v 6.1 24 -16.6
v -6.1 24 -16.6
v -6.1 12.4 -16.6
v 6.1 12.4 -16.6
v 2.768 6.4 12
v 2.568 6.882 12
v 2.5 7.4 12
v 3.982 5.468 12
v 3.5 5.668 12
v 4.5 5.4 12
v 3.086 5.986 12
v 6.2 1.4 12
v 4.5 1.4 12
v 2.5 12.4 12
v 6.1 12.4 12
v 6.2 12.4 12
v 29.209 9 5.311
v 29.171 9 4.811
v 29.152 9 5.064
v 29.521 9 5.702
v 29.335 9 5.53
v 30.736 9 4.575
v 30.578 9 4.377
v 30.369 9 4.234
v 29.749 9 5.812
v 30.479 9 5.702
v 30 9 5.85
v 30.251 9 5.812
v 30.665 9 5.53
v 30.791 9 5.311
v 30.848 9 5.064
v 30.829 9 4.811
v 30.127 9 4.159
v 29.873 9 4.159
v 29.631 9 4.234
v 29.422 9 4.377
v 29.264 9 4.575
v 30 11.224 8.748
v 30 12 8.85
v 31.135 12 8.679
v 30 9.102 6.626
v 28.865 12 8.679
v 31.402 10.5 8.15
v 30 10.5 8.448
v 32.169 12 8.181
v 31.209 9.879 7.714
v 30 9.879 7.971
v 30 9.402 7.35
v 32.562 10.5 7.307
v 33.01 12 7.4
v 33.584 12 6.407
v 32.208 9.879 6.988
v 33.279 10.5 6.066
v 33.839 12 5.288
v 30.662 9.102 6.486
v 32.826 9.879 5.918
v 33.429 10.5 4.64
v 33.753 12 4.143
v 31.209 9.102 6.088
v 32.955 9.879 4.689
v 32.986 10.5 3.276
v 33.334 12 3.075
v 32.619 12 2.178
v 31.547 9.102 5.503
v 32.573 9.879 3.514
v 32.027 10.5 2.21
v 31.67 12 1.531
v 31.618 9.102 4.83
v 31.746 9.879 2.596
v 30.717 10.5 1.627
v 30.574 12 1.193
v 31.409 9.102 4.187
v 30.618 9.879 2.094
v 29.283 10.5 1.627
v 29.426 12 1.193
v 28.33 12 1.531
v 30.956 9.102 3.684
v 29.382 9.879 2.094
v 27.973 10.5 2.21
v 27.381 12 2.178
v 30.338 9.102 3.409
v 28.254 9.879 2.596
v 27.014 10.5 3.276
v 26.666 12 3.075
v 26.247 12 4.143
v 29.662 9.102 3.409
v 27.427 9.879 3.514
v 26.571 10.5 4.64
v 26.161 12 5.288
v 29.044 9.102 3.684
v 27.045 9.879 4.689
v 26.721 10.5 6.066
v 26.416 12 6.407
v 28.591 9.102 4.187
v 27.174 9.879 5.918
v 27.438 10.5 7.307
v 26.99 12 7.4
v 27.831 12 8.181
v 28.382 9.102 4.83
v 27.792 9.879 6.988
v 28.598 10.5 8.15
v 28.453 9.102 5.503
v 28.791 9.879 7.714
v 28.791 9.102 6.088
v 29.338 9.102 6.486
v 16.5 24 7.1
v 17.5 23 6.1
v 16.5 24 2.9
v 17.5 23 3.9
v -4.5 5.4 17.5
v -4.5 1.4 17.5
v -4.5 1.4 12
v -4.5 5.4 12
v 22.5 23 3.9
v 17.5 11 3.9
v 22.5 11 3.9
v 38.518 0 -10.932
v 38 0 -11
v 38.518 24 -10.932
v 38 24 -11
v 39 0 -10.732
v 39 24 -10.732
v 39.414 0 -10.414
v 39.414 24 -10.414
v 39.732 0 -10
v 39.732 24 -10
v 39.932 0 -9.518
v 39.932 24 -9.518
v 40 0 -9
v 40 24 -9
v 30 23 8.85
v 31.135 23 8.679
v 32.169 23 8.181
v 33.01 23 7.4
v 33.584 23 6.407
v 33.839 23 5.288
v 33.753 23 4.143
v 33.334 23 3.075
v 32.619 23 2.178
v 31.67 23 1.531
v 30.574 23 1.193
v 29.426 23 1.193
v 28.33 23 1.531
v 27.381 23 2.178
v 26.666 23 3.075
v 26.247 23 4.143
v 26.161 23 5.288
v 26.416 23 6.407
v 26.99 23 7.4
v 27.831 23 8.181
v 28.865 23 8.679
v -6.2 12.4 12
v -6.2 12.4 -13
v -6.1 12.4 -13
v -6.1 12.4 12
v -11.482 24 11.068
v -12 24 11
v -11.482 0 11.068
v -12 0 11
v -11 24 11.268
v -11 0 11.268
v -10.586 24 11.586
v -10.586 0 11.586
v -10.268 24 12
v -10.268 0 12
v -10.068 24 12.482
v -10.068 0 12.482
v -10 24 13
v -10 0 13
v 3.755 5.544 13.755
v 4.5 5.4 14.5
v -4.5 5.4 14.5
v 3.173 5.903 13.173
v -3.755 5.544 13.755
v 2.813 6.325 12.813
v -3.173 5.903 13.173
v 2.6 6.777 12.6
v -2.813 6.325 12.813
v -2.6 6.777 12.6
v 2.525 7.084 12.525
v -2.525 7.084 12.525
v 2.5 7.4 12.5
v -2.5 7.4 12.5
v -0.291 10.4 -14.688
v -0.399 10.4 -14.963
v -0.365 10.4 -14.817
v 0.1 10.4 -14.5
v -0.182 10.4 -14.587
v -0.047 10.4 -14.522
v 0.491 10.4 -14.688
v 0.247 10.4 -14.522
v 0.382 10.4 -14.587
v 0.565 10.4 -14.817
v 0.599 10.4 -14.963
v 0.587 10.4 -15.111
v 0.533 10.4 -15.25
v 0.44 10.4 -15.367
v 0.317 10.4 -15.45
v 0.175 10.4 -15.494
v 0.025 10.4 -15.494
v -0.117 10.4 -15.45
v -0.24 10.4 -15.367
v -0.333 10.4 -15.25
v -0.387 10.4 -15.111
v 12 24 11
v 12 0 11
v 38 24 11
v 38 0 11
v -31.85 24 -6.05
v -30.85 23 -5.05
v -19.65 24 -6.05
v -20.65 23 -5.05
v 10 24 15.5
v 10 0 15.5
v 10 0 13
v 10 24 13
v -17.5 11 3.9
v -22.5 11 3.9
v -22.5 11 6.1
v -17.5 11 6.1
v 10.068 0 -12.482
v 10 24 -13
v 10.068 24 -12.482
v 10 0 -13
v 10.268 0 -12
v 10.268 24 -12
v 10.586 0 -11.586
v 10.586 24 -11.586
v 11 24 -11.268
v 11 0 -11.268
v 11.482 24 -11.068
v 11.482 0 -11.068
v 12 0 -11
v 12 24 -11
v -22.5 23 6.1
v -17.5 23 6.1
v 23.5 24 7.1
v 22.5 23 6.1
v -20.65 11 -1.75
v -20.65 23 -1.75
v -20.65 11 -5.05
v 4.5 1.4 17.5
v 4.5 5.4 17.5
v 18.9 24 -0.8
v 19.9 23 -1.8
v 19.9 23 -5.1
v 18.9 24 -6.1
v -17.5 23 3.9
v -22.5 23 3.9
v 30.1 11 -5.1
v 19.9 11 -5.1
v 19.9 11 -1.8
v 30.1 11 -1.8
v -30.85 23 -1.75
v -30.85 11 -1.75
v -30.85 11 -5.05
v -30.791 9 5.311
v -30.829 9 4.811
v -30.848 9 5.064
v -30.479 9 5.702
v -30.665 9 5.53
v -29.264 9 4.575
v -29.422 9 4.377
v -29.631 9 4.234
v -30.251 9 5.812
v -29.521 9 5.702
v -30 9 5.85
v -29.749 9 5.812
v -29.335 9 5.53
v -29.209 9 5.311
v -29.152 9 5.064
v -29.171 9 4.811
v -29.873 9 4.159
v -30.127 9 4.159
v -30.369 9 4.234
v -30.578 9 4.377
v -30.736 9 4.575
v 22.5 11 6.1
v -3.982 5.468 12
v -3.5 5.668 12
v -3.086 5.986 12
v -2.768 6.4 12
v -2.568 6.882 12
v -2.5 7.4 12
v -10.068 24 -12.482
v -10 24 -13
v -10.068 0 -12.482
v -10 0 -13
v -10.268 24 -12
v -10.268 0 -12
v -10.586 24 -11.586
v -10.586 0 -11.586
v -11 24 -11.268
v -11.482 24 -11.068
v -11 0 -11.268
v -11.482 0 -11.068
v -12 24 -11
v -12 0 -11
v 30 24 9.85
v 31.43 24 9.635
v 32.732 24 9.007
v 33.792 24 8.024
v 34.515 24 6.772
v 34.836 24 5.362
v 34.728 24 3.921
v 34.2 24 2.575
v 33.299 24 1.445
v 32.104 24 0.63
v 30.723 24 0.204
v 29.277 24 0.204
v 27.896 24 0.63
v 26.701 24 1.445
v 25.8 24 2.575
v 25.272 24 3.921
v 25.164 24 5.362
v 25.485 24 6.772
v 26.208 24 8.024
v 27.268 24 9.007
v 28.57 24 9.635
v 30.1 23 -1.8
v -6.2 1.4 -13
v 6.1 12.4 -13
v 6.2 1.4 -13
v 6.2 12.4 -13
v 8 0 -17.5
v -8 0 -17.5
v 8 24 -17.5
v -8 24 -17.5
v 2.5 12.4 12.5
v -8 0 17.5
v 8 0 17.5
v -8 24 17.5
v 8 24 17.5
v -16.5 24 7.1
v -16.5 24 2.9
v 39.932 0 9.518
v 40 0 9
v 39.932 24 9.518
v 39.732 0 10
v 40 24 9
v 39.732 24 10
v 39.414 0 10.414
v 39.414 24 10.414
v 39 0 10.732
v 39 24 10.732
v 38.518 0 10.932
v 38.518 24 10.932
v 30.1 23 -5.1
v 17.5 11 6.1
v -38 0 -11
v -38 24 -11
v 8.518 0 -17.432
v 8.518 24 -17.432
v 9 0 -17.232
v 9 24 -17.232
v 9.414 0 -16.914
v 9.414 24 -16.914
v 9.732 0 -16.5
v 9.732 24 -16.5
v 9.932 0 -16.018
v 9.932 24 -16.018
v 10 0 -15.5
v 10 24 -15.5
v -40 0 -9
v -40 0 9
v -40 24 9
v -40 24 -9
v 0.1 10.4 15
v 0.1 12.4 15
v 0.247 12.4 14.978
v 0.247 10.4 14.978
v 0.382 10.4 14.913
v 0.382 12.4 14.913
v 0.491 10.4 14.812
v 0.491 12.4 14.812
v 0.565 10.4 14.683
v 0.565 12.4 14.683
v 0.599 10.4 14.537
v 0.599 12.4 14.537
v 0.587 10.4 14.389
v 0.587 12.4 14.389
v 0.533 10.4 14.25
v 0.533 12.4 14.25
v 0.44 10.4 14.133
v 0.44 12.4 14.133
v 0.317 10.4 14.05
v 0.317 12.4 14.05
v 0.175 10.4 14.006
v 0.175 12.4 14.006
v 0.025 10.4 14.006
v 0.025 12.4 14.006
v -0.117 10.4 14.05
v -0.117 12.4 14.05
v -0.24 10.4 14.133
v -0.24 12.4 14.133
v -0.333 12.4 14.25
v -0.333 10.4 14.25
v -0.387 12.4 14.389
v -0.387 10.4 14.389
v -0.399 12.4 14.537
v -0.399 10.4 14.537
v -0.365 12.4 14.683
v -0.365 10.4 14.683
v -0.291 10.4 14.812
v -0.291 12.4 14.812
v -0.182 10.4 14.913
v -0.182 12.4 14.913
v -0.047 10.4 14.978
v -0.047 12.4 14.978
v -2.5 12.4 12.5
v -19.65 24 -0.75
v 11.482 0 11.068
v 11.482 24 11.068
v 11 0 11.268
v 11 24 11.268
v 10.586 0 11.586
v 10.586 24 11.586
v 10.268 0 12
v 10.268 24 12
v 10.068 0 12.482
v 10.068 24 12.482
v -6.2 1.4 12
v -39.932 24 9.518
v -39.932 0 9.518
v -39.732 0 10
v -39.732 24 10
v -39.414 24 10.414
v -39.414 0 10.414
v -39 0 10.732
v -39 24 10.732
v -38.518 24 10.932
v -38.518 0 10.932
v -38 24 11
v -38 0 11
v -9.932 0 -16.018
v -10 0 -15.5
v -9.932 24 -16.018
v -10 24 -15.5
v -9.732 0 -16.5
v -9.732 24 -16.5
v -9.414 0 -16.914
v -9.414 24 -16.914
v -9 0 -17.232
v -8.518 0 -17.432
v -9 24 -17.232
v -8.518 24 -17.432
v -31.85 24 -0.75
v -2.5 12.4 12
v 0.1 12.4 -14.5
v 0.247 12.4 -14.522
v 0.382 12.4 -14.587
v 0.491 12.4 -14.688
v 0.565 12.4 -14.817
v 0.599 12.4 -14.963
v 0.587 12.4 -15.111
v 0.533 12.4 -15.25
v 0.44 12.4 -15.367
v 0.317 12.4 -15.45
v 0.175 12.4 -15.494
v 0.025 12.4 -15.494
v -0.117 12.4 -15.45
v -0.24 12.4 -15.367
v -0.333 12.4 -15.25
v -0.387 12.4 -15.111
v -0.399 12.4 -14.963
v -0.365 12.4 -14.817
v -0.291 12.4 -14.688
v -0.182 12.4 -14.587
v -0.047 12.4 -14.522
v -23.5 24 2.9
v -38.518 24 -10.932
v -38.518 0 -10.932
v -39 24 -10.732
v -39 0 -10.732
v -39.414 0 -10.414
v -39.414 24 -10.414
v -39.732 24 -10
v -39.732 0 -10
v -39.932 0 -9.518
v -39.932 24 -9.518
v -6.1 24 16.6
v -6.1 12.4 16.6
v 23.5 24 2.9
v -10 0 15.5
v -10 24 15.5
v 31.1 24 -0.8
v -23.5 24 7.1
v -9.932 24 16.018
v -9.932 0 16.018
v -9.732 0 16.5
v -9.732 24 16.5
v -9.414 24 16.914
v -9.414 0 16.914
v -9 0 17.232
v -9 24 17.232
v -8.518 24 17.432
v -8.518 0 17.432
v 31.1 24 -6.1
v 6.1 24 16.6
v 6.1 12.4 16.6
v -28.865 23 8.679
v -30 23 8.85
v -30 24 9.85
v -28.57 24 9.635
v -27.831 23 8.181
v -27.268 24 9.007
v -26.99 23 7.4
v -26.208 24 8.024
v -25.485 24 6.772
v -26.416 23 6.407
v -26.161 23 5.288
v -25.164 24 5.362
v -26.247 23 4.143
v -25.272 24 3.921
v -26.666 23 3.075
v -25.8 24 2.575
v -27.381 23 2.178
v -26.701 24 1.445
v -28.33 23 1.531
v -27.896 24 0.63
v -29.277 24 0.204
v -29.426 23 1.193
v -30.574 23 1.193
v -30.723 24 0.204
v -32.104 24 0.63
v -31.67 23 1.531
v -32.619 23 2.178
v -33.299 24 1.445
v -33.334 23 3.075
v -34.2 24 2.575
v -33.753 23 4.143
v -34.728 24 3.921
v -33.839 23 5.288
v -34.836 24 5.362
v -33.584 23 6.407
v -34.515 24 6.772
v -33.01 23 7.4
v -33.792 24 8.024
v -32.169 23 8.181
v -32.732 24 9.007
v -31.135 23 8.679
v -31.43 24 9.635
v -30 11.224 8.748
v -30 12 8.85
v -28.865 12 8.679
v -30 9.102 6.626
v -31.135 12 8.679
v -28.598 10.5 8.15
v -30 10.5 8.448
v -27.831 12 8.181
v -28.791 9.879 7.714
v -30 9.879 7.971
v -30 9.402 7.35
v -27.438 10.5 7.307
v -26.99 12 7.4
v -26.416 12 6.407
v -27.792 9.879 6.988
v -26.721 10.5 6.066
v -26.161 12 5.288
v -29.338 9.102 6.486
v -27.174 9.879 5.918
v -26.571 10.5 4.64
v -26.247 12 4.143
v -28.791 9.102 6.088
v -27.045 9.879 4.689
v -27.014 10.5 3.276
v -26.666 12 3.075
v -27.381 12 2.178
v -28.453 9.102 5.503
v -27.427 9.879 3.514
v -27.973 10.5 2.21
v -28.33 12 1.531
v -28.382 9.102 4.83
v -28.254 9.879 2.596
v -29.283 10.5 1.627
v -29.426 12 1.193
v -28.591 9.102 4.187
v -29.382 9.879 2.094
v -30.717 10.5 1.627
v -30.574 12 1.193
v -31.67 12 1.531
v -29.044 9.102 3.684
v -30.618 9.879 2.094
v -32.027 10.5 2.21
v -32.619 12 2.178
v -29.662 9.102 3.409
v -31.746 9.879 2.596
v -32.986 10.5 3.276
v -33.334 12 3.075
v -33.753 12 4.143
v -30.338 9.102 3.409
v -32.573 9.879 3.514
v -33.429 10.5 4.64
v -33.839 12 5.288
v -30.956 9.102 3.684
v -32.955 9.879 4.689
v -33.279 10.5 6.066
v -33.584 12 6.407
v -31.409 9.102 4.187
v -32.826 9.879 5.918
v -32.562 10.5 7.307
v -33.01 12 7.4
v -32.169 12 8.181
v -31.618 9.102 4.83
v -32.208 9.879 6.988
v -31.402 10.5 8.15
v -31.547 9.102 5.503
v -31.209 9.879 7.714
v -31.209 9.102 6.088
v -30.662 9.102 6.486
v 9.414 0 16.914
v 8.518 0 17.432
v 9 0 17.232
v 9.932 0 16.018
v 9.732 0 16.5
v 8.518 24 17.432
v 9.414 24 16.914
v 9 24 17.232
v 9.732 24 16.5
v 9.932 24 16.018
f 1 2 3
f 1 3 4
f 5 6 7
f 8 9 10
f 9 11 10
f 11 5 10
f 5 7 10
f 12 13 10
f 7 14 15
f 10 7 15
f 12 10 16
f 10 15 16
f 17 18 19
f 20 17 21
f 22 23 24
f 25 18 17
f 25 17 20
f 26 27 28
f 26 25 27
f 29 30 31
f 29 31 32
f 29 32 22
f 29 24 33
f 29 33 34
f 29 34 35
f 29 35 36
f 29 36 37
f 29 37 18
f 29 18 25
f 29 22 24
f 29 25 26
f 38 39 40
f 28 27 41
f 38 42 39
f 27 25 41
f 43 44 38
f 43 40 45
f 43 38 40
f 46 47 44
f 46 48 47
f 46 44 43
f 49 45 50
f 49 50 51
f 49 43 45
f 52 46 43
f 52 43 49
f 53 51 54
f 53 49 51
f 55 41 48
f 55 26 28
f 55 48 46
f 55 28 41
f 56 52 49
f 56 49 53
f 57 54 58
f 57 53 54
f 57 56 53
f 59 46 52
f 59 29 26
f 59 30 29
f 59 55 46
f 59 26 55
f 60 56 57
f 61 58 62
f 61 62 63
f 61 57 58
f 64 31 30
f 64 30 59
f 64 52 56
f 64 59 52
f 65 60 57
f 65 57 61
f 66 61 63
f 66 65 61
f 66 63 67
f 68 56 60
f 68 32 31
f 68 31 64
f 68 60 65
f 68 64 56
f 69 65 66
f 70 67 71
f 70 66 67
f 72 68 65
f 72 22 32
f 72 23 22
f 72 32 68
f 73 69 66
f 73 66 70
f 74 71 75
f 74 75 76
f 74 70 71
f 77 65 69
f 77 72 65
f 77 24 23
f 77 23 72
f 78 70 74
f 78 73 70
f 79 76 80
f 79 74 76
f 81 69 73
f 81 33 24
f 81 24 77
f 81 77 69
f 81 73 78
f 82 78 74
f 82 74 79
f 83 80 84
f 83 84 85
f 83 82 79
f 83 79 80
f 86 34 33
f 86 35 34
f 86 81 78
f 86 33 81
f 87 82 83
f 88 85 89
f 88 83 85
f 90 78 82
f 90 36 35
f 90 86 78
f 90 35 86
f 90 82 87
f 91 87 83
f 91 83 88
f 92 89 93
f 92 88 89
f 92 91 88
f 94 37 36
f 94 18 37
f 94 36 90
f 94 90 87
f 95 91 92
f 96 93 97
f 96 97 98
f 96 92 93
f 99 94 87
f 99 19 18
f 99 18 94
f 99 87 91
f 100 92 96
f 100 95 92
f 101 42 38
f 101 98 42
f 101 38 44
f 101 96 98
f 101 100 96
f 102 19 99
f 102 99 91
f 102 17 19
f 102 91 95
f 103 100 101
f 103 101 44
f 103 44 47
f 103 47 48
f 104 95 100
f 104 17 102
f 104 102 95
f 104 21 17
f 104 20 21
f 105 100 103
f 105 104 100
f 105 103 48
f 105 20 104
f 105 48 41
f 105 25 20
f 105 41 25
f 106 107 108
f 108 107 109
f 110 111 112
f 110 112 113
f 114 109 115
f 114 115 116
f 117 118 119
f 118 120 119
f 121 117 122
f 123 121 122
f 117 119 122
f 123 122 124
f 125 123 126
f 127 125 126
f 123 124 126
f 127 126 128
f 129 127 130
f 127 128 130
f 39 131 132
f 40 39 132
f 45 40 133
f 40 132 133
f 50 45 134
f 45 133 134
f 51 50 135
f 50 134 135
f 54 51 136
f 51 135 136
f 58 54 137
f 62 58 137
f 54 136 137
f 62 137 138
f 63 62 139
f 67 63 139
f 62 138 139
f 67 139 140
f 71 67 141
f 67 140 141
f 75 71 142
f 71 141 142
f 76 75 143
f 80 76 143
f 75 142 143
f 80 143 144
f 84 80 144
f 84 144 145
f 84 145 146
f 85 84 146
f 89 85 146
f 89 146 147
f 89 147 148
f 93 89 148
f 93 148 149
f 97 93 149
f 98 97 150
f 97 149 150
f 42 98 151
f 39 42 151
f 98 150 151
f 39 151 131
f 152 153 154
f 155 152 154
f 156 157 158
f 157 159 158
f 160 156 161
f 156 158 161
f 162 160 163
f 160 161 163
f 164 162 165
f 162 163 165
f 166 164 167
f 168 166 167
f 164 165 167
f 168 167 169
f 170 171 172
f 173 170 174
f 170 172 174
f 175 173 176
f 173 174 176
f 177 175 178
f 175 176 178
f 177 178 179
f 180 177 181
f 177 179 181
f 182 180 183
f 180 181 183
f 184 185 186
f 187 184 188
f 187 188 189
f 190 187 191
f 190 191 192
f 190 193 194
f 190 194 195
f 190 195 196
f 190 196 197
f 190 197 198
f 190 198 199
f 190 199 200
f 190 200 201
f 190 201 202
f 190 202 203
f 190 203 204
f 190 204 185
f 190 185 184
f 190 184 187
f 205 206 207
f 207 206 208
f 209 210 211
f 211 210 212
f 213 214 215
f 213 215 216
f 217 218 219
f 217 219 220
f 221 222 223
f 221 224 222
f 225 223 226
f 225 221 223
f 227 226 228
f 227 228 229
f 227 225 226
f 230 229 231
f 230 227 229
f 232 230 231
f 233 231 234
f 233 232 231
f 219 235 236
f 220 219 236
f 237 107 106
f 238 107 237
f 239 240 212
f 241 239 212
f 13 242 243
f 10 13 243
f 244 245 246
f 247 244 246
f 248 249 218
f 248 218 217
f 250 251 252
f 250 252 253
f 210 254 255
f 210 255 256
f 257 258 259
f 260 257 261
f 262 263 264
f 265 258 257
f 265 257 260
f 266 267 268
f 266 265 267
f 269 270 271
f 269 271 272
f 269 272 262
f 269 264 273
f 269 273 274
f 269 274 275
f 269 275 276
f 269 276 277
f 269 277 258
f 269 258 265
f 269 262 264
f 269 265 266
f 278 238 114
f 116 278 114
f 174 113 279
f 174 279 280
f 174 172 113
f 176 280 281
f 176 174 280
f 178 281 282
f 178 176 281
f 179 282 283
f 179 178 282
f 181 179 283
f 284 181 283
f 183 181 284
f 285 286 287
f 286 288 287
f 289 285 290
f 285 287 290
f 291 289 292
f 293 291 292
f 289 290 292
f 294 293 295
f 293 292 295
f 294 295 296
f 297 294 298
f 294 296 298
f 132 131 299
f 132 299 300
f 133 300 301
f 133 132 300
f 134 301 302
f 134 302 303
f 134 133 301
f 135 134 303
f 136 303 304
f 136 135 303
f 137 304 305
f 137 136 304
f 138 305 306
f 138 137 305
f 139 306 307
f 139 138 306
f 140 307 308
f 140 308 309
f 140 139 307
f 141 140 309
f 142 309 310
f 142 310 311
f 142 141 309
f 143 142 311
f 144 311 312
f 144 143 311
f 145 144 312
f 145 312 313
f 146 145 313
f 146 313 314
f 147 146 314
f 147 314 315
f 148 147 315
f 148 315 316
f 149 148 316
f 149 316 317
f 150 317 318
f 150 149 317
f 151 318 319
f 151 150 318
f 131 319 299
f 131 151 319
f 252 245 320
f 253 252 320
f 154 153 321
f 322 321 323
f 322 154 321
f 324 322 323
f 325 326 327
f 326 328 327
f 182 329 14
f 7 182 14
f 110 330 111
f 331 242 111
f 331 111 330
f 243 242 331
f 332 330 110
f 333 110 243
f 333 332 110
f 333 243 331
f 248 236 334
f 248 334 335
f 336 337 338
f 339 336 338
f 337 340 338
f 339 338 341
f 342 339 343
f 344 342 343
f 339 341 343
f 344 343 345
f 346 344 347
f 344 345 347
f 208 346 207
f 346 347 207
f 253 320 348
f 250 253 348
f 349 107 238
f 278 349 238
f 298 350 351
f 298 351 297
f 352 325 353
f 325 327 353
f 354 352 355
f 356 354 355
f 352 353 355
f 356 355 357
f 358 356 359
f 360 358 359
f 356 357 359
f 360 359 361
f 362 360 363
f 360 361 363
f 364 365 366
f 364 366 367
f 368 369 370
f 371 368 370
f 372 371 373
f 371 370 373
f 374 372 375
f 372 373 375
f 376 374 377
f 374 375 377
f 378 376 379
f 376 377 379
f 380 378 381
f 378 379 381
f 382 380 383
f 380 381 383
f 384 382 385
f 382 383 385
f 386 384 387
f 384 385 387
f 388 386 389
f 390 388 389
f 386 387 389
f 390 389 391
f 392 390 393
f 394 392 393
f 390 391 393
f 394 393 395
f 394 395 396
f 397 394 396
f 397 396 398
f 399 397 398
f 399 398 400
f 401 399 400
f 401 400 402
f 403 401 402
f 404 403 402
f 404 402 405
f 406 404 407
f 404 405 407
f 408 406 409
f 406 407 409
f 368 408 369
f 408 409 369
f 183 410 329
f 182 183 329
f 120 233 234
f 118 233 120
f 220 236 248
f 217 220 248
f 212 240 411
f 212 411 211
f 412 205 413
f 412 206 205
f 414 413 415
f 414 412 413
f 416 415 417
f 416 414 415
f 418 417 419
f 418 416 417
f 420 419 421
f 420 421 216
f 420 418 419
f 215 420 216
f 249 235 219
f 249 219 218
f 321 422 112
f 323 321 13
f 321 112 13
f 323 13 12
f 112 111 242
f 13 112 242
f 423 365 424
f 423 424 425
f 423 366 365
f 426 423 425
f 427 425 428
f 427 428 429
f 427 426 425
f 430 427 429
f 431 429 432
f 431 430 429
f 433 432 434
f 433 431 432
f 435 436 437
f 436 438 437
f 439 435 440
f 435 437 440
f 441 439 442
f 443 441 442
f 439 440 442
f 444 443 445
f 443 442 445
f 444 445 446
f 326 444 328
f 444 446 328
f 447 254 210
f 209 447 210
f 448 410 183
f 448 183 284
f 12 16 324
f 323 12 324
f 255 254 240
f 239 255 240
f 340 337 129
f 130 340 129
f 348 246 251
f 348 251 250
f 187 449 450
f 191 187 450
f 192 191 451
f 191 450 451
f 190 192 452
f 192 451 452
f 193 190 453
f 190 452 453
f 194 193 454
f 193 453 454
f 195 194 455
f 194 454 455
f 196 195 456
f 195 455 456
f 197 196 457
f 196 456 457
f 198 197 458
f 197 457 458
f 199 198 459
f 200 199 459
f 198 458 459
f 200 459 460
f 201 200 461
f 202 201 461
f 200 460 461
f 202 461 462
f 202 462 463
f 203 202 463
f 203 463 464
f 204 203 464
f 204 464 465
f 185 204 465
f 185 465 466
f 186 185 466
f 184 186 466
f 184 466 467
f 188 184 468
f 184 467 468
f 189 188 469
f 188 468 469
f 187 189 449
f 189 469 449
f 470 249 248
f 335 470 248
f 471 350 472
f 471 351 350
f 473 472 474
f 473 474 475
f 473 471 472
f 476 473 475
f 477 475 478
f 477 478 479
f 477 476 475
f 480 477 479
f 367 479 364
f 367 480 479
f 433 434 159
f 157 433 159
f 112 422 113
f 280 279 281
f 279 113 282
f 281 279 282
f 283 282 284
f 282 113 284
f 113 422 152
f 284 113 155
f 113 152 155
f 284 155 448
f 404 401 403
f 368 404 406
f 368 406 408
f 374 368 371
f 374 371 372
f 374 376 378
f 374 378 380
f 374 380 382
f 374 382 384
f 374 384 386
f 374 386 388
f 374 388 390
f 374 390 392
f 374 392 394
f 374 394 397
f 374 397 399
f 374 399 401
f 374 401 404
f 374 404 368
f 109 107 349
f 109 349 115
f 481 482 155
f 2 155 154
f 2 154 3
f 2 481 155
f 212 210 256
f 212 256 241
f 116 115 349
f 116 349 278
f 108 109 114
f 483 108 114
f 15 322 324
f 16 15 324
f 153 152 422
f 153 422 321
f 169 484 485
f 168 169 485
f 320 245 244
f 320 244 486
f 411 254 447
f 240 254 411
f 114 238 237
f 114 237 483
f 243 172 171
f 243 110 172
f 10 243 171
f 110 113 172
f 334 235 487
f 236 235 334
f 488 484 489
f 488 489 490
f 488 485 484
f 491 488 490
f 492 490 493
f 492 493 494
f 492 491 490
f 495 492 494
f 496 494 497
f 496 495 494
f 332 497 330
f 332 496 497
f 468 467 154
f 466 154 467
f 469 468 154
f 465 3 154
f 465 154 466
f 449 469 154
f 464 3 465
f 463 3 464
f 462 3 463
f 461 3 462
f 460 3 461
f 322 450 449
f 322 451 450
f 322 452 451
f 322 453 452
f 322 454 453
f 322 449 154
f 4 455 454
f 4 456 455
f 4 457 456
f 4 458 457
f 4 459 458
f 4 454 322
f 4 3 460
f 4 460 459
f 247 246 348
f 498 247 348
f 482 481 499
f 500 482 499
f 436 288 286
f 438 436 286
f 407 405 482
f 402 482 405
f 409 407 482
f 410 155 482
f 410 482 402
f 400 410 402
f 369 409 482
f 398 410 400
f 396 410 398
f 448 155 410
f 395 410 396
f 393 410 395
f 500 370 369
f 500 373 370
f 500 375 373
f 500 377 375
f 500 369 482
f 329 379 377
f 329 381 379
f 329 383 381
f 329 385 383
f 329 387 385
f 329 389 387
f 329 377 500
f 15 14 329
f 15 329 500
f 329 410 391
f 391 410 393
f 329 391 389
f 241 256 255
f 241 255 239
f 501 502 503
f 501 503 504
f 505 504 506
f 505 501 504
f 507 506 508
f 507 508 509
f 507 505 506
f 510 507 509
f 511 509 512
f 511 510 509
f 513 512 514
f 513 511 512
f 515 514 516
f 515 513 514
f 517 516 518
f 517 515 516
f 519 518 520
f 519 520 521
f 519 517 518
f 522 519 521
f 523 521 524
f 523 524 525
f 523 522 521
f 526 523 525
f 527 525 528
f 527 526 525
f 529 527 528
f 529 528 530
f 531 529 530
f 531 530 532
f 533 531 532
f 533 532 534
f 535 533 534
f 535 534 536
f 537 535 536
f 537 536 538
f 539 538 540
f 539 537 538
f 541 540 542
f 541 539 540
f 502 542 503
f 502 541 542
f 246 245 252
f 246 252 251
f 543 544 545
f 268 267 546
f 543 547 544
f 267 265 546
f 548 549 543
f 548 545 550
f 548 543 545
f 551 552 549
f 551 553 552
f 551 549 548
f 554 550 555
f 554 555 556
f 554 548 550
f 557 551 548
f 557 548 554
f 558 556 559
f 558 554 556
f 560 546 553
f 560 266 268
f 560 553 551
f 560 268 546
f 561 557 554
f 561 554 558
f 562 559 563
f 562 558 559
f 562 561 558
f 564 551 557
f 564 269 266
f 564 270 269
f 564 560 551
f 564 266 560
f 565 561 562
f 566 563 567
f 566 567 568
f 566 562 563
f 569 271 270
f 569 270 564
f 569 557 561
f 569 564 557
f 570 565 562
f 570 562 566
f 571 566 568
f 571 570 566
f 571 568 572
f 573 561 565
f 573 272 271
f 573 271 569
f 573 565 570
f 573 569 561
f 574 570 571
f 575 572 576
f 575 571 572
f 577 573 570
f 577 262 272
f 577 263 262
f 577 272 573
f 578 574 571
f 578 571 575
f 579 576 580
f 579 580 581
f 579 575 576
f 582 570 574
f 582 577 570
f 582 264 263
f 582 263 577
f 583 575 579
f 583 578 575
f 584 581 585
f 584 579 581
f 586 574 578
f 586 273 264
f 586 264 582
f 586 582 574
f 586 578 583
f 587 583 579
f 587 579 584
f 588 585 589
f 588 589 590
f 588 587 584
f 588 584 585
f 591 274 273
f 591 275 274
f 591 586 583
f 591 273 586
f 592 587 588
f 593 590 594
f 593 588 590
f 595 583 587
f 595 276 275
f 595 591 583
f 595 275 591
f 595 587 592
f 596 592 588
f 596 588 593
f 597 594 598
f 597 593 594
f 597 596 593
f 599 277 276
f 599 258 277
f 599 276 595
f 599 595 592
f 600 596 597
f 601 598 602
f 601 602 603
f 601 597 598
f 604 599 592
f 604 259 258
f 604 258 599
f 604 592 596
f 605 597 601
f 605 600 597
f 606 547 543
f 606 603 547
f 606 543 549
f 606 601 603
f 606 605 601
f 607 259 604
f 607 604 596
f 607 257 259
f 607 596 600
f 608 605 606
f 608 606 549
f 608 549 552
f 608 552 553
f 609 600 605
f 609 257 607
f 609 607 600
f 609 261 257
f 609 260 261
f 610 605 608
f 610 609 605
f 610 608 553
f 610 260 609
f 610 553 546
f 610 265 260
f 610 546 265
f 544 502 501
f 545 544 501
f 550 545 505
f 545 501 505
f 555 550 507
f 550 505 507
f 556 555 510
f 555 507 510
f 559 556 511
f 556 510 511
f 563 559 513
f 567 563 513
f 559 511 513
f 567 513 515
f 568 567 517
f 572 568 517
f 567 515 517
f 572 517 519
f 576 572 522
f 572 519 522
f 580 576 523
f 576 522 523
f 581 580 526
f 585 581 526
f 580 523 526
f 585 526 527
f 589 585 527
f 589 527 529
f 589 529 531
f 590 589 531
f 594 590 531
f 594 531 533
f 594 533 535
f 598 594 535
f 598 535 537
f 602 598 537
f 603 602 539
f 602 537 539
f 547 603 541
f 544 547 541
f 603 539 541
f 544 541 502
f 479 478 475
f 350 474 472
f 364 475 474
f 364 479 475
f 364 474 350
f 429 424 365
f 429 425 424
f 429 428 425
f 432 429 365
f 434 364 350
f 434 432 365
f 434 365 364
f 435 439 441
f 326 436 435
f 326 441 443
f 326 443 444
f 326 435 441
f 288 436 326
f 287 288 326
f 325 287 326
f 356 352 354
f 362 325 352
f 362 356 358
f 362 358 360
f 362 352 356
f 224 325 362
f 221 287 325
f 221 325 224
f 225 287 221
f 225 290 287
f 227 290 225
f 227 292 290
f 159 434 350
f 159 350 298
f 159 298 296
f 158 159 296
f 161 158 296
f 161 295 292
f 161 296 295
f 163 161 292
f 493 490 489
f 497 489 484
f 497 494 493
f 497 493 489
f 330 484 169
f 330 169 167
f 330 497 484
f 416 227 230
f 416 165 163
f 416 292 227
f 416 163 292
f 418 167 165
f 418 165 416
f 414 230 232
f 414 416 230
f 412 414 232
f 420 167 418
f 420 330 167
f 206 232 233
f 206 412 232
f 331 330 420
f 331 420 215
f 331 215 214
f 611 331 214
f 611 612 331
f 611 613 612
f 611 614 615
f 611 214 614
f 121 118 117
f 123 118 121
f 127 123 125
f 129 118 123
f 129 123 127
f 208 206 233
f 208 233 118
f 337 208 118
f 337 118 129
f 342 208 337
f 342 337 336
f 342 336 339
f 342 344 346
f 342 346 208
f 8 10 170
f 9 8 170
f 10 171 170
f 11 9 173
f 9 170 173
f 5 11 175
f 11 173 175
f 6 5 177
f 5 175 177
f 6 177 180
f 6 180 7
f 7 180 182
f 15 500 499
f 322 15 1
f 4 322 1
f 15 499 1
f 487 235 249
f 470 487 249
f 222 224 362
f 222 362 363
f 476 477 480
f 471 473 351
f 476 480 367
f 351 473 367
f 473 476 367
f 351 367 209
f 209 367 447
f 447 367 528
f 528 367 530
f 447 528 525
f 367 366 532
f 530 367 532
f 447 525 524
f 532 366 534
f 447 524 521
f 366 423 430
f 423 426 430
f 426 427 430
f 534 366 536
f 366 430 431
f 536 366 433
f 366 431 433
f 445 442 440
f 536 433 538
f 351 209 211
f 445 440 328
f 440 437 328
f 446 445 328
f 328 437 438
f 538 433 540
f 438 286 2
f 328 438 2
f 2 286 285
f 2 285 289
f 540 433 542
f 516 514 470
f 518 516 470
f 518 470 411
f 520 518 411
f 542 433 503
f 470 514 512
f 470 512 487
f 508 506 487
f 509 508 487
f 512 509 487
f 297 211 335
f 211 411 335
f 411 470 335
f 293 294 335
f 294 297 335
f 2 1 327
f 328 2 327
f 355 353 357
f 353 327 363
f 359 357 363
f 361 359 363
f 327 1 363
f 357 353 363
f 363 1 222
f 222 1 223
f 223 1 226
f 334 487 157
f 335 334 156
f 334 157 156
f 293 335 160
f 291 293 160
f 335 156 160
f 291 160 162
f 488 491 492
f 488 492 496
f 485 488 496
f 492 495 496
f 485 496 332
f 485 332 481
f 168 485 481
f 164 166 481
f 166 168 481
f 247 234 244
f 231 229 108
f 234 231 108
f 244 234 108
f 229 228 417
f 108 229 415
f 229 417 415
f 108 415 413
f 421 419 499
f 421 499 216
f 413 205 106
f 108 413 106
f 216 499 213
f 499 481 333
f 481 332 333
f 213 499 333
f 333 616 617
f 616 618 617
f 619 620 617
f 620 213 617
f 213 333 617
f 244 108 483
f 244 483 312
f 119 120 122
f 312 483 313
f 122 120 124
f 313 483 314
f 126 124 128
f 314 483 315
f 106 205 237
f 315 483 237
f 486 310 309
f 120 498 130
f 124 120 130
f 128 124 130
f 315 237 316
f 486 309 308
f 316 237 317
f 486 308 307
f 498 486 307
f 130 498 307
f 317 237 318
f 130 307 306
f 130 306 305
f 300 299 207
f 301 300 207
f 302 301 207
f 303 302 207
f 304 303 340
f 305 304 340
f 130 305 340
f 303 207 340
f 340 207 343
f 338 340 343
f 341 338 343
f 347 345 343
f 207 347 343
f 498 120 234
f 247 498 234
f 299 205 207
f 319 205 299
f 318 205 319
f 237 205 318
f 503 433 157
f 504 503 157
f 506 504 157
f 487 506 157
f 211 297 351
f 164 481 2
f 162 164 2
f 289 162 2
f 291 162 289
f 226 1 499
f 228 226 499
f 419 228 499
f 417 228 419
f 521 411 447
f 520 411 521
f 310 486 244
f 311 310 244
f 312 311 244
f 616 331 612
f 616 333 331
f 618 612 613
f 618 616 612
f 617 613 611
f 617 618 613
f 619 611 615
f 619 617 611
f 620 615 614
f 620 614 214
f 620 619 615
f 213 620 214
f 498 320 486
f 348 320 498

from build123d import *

# Parameters (mm, degrees)
SKETCH1_W               = 80
SKETCH1_H               = 22
BOSS_EXTRUDE1_DEPTH     = 24
SKETCH2_R               = 3.85
EYESHAFT_HOLES_DEPTH    = 15
SKETCH5_W               = 5
SKETCH5_H               = 2.2
FRONT_LEG_HOLES_DEPTH   = 13
SKETCH6_W               = 20
SKETCH6_H               = 24
SERVO_BLOCK_DEPTH       = 17.5
SKETCH7_W               = 10.2
SKETCH7_H               = 3.3
BACK_LEGS_DEPTH         = 13
FILLET1_R               = 3
SKETCH8_R               = 2.714277304
CUT_EXTRUDE4_DEPTH      = 14
SKETCH9_W               = 12.2
SKETCH9_H               = 33.2
SERVO_ARMS1_DEPTH       = 11.6
FILLET2_R               = 2
CHAMFER1_SIZE           = 1
SKETCH14_W              = 12.4
SKETCH14_H              = 25
CUT_EXTRUDE5_DEPTH      = 11
SKETCH15_W              = 9
SKETCH15_H              = 4
CUT_EXTRUDE6_DEPTH      = 5.5
SKETCH16_W              = 5
SKETCH16_H              = 1
CUT_EXTRUDE7_DEPTH      = 11
SKETCH13_R              = 0.5
SERVO_SCREW_HOLES_DEPTH = 2
FILLET3_R               = 2


with BuildPart() as part:
    # Sketch1 → Boss-Extrude1 (new body)
    with BuildSketch(Plane(origin=(0, 0, 0), x_dir=(1, 0, 0), z_dir=(0, 1, 0))):
        Rectangle(SKETCH1_W, SKETCH1_H)
    extrude(amount=BOSS_EXTRUDE1_DEPTH)

    # Sketch2 → Eyeshaft holes (cut)
    with BuildSketch(Plane(origin=(0, 24, 0), x_dir=(1, 0, 0), z_dir=(0, 1, 0))):
        with Locations(Location((-30, -5, 0), (0, 0, 270))):
            Circle(SKETCH2_R)
        with Locations(Location((30, -5, 0), (0, 0, 270))):
            Circle(SKETCH2_R)
    extrude(amount=-EYESHAFT_HOLES_DEPTH, mode=Mode.SUBTRACT)

    # Sketch5 → Front leg holes (cut)
    with BuildSketch(Plane(origin=(0, 24, 0), x_dir=(1, 0, 0), z_dir=(0, 1, 0))):
        with Locations((-20, -5)):
            Rectangle(SKETCH5_W, SKETCH5_H)
        with Locations((20, -5)):
            Rectangle(SKETCH5_W, SKETCH5_H)
    extrude(amount=-FRONT_LEG_HOLES_DEPTH, mode=Mode.SUBTRACT)

    # Sketch6 → Servo block (add, symmetric)
    with BuildSketch(Plane.XY):
        with Locations((0, 12)):
            Rectangle(SKETCH6_W, SKETCH6_H)
    extrude(amount=SERVO_BLOCK_DEPTH, both=True)

    # Sketch7 → Back Legs (cut)
    with BuildSketch(Plane(origin=(0, 24, 0), x_dir=(1, 0, 0), z_dir=(0, 1, 0))):
        with Locations((-25.75, 3.4)):
            Rectangle(SKETCH7_W, SKETCH7_H)
        with Locations((25, 3.45)):
            Rectangle(SKETCH7_W, SKETCH7_H)
    extrude(amount=-BACK_LEGS_DEPTH, mode=Mode.SUBTRACT)

    # Fillet1
    fillet1_edges = [part.edges().sort_by_distance(p)[0] for p in [
        (-30, 9, 1.15),
        (30, 9, 1.15),
    ]]
    fillet(fillet1_edges, radius=FILLET1_R)

    # Sketch8 → Cut-Extrude4 (cut)
    with BuildSketch(Plane(origin=(0, 24, 0), x_dir=(1, 0, 0), z_dir=(0, 1, 0))):
        with Locations(Location((0, -5, 0), (0, 0, 270))):
            Circle(SKETCH8_R)
    extrude(amount=-CUT_EXTRUDE4_DEPTH, mode=Mode.SUBTRACT)

    # Sketch9 → Servo arms1 (cut)
    with BuildSketch(Plane(origin=(0, 24, 0), x_dir=(1, 0, 0), z_dir=(0, 1, 0))):
        Rectangle(SKETCH9_W, SKETCH9_H)
    extrude(amount=-SERVO_ARMS1_DEPTH, mode=Mode.SUBTRACT)

    # Fillet2
    fillet2_edges = [part.edges().sort_by_distance(p)[0] for p in [
        (10, 12, -11),
        (10, 12, -17.5),
        (10, 12, 11),
        (-10, 12, -11),
        (-10, 12, -17.5),
        (-10, 12, 11),
        (10, 12, 17.5),
        (-10, 12, 17.5),
        (40, 12, 11),
        (-40, 12, 11),
        (-40, 12, -11),
        (40, 12, -11),
    ]]
    fillet(fillet2_edges, radius=FILLET2_R)

    # Chamfer1
    chamfer1_edges = [part.edges().sort_by_distance(p)[0] for p in [
        (-30, 24, 1.15),
        (30, 24, 1.15),
        (-17.5, 24, 5),
        (-20, 24, 3.9),
        (-22.5, 24, 5),
        (-20, 24, 6.1),
        (22.5, 24, 5),
        (20, 24, 3.9),
        (17.5, 24, 5),
        (20, 24, 6.1),
        (-30.85, 24, -3.4),
        (-25.75, 24, -1.75),
        (-20.65, 24, -3.4),
        (-25.75, 24, -5.05),
        (19.9, 24, -3.45),
        (25, 24, -1.8),
        (30.1, 24, -3.45),
        (25, 24, -5.1),
    ]]
    chamfer(chamfer1_edges, length=CHAMFER1_SIZE)

    # Sketch14 → Cut-Extrude5 (cut)
    with BuildSketch(Plane(origin=(0, 12.4, 0), x_dir=(1, 0, 0), z_dir=(0, 1, 0))):
        with Locations((0, 0.5)):
            Rectangle(SKETCH14_W, SKETCH14_H)
    extrude(amount=-CUT_EXTRUDE5_DEPTH, mode=Mode.SUBTRACT)

    # Sketch15 → Cut-Extrude6 (cut)
    with BuildSketch(Plane.XY.offset(17.5)):
        with Locations((0, 3.4)):
            Rectangle(SKETCH15_W, SKETCH15_H)
    extrude(amount=-CUT_EXTRUDE6_DEPTH, mode=Mode.SUBTRACT)

    # Sketch16 → Cut-Extrude7 (cut)
    with BuildSketch(Plane(origin=(0, 12.4, 0), x_dir=(1, 0, 0), z_dir=(0, 1, 0))):
        with Locations((0, -12)):
            Rectangle(SKETCH16_W, SKETCH16_H)
    extrude(amount=-CUT_EXTRUDE7_DEPTH, mode=Mode.SUBTRACT)

    # Sketch13 → Servo Screw Holes (cut)
    with BuildSketch(Plane(origin=(0, 12.4, 0), x_dir=(1, 0, 0), z_dir=(0, 1, 0))):
        with Locations(Location((0.1, 15, 0), (0, 0, 270))):
            Circle(SKETCH13_R)
        with Locations(Location((0.1, -14.5, 0), (0, 0, 270))):
            Circle(SKETCH13_R)
    extrude(amount=-SERVO_SCREW_HOLES_DEPTH, mode=Mode.SUBTRACT)

    # Fillet3
    fillet3_edges = [part.edges().sort_by_distance(p)[0] for p in [
        (0, 5.4, 12.5),
        (2.5, 5.4, 12.25),
        (-2.5, 5.4, 12.25),
    ]]
    fillet(fillet3_edges, radius=FILLET3_R - 0.0001)  # a hair under: the kernel refuses the full size


solid = part.part
